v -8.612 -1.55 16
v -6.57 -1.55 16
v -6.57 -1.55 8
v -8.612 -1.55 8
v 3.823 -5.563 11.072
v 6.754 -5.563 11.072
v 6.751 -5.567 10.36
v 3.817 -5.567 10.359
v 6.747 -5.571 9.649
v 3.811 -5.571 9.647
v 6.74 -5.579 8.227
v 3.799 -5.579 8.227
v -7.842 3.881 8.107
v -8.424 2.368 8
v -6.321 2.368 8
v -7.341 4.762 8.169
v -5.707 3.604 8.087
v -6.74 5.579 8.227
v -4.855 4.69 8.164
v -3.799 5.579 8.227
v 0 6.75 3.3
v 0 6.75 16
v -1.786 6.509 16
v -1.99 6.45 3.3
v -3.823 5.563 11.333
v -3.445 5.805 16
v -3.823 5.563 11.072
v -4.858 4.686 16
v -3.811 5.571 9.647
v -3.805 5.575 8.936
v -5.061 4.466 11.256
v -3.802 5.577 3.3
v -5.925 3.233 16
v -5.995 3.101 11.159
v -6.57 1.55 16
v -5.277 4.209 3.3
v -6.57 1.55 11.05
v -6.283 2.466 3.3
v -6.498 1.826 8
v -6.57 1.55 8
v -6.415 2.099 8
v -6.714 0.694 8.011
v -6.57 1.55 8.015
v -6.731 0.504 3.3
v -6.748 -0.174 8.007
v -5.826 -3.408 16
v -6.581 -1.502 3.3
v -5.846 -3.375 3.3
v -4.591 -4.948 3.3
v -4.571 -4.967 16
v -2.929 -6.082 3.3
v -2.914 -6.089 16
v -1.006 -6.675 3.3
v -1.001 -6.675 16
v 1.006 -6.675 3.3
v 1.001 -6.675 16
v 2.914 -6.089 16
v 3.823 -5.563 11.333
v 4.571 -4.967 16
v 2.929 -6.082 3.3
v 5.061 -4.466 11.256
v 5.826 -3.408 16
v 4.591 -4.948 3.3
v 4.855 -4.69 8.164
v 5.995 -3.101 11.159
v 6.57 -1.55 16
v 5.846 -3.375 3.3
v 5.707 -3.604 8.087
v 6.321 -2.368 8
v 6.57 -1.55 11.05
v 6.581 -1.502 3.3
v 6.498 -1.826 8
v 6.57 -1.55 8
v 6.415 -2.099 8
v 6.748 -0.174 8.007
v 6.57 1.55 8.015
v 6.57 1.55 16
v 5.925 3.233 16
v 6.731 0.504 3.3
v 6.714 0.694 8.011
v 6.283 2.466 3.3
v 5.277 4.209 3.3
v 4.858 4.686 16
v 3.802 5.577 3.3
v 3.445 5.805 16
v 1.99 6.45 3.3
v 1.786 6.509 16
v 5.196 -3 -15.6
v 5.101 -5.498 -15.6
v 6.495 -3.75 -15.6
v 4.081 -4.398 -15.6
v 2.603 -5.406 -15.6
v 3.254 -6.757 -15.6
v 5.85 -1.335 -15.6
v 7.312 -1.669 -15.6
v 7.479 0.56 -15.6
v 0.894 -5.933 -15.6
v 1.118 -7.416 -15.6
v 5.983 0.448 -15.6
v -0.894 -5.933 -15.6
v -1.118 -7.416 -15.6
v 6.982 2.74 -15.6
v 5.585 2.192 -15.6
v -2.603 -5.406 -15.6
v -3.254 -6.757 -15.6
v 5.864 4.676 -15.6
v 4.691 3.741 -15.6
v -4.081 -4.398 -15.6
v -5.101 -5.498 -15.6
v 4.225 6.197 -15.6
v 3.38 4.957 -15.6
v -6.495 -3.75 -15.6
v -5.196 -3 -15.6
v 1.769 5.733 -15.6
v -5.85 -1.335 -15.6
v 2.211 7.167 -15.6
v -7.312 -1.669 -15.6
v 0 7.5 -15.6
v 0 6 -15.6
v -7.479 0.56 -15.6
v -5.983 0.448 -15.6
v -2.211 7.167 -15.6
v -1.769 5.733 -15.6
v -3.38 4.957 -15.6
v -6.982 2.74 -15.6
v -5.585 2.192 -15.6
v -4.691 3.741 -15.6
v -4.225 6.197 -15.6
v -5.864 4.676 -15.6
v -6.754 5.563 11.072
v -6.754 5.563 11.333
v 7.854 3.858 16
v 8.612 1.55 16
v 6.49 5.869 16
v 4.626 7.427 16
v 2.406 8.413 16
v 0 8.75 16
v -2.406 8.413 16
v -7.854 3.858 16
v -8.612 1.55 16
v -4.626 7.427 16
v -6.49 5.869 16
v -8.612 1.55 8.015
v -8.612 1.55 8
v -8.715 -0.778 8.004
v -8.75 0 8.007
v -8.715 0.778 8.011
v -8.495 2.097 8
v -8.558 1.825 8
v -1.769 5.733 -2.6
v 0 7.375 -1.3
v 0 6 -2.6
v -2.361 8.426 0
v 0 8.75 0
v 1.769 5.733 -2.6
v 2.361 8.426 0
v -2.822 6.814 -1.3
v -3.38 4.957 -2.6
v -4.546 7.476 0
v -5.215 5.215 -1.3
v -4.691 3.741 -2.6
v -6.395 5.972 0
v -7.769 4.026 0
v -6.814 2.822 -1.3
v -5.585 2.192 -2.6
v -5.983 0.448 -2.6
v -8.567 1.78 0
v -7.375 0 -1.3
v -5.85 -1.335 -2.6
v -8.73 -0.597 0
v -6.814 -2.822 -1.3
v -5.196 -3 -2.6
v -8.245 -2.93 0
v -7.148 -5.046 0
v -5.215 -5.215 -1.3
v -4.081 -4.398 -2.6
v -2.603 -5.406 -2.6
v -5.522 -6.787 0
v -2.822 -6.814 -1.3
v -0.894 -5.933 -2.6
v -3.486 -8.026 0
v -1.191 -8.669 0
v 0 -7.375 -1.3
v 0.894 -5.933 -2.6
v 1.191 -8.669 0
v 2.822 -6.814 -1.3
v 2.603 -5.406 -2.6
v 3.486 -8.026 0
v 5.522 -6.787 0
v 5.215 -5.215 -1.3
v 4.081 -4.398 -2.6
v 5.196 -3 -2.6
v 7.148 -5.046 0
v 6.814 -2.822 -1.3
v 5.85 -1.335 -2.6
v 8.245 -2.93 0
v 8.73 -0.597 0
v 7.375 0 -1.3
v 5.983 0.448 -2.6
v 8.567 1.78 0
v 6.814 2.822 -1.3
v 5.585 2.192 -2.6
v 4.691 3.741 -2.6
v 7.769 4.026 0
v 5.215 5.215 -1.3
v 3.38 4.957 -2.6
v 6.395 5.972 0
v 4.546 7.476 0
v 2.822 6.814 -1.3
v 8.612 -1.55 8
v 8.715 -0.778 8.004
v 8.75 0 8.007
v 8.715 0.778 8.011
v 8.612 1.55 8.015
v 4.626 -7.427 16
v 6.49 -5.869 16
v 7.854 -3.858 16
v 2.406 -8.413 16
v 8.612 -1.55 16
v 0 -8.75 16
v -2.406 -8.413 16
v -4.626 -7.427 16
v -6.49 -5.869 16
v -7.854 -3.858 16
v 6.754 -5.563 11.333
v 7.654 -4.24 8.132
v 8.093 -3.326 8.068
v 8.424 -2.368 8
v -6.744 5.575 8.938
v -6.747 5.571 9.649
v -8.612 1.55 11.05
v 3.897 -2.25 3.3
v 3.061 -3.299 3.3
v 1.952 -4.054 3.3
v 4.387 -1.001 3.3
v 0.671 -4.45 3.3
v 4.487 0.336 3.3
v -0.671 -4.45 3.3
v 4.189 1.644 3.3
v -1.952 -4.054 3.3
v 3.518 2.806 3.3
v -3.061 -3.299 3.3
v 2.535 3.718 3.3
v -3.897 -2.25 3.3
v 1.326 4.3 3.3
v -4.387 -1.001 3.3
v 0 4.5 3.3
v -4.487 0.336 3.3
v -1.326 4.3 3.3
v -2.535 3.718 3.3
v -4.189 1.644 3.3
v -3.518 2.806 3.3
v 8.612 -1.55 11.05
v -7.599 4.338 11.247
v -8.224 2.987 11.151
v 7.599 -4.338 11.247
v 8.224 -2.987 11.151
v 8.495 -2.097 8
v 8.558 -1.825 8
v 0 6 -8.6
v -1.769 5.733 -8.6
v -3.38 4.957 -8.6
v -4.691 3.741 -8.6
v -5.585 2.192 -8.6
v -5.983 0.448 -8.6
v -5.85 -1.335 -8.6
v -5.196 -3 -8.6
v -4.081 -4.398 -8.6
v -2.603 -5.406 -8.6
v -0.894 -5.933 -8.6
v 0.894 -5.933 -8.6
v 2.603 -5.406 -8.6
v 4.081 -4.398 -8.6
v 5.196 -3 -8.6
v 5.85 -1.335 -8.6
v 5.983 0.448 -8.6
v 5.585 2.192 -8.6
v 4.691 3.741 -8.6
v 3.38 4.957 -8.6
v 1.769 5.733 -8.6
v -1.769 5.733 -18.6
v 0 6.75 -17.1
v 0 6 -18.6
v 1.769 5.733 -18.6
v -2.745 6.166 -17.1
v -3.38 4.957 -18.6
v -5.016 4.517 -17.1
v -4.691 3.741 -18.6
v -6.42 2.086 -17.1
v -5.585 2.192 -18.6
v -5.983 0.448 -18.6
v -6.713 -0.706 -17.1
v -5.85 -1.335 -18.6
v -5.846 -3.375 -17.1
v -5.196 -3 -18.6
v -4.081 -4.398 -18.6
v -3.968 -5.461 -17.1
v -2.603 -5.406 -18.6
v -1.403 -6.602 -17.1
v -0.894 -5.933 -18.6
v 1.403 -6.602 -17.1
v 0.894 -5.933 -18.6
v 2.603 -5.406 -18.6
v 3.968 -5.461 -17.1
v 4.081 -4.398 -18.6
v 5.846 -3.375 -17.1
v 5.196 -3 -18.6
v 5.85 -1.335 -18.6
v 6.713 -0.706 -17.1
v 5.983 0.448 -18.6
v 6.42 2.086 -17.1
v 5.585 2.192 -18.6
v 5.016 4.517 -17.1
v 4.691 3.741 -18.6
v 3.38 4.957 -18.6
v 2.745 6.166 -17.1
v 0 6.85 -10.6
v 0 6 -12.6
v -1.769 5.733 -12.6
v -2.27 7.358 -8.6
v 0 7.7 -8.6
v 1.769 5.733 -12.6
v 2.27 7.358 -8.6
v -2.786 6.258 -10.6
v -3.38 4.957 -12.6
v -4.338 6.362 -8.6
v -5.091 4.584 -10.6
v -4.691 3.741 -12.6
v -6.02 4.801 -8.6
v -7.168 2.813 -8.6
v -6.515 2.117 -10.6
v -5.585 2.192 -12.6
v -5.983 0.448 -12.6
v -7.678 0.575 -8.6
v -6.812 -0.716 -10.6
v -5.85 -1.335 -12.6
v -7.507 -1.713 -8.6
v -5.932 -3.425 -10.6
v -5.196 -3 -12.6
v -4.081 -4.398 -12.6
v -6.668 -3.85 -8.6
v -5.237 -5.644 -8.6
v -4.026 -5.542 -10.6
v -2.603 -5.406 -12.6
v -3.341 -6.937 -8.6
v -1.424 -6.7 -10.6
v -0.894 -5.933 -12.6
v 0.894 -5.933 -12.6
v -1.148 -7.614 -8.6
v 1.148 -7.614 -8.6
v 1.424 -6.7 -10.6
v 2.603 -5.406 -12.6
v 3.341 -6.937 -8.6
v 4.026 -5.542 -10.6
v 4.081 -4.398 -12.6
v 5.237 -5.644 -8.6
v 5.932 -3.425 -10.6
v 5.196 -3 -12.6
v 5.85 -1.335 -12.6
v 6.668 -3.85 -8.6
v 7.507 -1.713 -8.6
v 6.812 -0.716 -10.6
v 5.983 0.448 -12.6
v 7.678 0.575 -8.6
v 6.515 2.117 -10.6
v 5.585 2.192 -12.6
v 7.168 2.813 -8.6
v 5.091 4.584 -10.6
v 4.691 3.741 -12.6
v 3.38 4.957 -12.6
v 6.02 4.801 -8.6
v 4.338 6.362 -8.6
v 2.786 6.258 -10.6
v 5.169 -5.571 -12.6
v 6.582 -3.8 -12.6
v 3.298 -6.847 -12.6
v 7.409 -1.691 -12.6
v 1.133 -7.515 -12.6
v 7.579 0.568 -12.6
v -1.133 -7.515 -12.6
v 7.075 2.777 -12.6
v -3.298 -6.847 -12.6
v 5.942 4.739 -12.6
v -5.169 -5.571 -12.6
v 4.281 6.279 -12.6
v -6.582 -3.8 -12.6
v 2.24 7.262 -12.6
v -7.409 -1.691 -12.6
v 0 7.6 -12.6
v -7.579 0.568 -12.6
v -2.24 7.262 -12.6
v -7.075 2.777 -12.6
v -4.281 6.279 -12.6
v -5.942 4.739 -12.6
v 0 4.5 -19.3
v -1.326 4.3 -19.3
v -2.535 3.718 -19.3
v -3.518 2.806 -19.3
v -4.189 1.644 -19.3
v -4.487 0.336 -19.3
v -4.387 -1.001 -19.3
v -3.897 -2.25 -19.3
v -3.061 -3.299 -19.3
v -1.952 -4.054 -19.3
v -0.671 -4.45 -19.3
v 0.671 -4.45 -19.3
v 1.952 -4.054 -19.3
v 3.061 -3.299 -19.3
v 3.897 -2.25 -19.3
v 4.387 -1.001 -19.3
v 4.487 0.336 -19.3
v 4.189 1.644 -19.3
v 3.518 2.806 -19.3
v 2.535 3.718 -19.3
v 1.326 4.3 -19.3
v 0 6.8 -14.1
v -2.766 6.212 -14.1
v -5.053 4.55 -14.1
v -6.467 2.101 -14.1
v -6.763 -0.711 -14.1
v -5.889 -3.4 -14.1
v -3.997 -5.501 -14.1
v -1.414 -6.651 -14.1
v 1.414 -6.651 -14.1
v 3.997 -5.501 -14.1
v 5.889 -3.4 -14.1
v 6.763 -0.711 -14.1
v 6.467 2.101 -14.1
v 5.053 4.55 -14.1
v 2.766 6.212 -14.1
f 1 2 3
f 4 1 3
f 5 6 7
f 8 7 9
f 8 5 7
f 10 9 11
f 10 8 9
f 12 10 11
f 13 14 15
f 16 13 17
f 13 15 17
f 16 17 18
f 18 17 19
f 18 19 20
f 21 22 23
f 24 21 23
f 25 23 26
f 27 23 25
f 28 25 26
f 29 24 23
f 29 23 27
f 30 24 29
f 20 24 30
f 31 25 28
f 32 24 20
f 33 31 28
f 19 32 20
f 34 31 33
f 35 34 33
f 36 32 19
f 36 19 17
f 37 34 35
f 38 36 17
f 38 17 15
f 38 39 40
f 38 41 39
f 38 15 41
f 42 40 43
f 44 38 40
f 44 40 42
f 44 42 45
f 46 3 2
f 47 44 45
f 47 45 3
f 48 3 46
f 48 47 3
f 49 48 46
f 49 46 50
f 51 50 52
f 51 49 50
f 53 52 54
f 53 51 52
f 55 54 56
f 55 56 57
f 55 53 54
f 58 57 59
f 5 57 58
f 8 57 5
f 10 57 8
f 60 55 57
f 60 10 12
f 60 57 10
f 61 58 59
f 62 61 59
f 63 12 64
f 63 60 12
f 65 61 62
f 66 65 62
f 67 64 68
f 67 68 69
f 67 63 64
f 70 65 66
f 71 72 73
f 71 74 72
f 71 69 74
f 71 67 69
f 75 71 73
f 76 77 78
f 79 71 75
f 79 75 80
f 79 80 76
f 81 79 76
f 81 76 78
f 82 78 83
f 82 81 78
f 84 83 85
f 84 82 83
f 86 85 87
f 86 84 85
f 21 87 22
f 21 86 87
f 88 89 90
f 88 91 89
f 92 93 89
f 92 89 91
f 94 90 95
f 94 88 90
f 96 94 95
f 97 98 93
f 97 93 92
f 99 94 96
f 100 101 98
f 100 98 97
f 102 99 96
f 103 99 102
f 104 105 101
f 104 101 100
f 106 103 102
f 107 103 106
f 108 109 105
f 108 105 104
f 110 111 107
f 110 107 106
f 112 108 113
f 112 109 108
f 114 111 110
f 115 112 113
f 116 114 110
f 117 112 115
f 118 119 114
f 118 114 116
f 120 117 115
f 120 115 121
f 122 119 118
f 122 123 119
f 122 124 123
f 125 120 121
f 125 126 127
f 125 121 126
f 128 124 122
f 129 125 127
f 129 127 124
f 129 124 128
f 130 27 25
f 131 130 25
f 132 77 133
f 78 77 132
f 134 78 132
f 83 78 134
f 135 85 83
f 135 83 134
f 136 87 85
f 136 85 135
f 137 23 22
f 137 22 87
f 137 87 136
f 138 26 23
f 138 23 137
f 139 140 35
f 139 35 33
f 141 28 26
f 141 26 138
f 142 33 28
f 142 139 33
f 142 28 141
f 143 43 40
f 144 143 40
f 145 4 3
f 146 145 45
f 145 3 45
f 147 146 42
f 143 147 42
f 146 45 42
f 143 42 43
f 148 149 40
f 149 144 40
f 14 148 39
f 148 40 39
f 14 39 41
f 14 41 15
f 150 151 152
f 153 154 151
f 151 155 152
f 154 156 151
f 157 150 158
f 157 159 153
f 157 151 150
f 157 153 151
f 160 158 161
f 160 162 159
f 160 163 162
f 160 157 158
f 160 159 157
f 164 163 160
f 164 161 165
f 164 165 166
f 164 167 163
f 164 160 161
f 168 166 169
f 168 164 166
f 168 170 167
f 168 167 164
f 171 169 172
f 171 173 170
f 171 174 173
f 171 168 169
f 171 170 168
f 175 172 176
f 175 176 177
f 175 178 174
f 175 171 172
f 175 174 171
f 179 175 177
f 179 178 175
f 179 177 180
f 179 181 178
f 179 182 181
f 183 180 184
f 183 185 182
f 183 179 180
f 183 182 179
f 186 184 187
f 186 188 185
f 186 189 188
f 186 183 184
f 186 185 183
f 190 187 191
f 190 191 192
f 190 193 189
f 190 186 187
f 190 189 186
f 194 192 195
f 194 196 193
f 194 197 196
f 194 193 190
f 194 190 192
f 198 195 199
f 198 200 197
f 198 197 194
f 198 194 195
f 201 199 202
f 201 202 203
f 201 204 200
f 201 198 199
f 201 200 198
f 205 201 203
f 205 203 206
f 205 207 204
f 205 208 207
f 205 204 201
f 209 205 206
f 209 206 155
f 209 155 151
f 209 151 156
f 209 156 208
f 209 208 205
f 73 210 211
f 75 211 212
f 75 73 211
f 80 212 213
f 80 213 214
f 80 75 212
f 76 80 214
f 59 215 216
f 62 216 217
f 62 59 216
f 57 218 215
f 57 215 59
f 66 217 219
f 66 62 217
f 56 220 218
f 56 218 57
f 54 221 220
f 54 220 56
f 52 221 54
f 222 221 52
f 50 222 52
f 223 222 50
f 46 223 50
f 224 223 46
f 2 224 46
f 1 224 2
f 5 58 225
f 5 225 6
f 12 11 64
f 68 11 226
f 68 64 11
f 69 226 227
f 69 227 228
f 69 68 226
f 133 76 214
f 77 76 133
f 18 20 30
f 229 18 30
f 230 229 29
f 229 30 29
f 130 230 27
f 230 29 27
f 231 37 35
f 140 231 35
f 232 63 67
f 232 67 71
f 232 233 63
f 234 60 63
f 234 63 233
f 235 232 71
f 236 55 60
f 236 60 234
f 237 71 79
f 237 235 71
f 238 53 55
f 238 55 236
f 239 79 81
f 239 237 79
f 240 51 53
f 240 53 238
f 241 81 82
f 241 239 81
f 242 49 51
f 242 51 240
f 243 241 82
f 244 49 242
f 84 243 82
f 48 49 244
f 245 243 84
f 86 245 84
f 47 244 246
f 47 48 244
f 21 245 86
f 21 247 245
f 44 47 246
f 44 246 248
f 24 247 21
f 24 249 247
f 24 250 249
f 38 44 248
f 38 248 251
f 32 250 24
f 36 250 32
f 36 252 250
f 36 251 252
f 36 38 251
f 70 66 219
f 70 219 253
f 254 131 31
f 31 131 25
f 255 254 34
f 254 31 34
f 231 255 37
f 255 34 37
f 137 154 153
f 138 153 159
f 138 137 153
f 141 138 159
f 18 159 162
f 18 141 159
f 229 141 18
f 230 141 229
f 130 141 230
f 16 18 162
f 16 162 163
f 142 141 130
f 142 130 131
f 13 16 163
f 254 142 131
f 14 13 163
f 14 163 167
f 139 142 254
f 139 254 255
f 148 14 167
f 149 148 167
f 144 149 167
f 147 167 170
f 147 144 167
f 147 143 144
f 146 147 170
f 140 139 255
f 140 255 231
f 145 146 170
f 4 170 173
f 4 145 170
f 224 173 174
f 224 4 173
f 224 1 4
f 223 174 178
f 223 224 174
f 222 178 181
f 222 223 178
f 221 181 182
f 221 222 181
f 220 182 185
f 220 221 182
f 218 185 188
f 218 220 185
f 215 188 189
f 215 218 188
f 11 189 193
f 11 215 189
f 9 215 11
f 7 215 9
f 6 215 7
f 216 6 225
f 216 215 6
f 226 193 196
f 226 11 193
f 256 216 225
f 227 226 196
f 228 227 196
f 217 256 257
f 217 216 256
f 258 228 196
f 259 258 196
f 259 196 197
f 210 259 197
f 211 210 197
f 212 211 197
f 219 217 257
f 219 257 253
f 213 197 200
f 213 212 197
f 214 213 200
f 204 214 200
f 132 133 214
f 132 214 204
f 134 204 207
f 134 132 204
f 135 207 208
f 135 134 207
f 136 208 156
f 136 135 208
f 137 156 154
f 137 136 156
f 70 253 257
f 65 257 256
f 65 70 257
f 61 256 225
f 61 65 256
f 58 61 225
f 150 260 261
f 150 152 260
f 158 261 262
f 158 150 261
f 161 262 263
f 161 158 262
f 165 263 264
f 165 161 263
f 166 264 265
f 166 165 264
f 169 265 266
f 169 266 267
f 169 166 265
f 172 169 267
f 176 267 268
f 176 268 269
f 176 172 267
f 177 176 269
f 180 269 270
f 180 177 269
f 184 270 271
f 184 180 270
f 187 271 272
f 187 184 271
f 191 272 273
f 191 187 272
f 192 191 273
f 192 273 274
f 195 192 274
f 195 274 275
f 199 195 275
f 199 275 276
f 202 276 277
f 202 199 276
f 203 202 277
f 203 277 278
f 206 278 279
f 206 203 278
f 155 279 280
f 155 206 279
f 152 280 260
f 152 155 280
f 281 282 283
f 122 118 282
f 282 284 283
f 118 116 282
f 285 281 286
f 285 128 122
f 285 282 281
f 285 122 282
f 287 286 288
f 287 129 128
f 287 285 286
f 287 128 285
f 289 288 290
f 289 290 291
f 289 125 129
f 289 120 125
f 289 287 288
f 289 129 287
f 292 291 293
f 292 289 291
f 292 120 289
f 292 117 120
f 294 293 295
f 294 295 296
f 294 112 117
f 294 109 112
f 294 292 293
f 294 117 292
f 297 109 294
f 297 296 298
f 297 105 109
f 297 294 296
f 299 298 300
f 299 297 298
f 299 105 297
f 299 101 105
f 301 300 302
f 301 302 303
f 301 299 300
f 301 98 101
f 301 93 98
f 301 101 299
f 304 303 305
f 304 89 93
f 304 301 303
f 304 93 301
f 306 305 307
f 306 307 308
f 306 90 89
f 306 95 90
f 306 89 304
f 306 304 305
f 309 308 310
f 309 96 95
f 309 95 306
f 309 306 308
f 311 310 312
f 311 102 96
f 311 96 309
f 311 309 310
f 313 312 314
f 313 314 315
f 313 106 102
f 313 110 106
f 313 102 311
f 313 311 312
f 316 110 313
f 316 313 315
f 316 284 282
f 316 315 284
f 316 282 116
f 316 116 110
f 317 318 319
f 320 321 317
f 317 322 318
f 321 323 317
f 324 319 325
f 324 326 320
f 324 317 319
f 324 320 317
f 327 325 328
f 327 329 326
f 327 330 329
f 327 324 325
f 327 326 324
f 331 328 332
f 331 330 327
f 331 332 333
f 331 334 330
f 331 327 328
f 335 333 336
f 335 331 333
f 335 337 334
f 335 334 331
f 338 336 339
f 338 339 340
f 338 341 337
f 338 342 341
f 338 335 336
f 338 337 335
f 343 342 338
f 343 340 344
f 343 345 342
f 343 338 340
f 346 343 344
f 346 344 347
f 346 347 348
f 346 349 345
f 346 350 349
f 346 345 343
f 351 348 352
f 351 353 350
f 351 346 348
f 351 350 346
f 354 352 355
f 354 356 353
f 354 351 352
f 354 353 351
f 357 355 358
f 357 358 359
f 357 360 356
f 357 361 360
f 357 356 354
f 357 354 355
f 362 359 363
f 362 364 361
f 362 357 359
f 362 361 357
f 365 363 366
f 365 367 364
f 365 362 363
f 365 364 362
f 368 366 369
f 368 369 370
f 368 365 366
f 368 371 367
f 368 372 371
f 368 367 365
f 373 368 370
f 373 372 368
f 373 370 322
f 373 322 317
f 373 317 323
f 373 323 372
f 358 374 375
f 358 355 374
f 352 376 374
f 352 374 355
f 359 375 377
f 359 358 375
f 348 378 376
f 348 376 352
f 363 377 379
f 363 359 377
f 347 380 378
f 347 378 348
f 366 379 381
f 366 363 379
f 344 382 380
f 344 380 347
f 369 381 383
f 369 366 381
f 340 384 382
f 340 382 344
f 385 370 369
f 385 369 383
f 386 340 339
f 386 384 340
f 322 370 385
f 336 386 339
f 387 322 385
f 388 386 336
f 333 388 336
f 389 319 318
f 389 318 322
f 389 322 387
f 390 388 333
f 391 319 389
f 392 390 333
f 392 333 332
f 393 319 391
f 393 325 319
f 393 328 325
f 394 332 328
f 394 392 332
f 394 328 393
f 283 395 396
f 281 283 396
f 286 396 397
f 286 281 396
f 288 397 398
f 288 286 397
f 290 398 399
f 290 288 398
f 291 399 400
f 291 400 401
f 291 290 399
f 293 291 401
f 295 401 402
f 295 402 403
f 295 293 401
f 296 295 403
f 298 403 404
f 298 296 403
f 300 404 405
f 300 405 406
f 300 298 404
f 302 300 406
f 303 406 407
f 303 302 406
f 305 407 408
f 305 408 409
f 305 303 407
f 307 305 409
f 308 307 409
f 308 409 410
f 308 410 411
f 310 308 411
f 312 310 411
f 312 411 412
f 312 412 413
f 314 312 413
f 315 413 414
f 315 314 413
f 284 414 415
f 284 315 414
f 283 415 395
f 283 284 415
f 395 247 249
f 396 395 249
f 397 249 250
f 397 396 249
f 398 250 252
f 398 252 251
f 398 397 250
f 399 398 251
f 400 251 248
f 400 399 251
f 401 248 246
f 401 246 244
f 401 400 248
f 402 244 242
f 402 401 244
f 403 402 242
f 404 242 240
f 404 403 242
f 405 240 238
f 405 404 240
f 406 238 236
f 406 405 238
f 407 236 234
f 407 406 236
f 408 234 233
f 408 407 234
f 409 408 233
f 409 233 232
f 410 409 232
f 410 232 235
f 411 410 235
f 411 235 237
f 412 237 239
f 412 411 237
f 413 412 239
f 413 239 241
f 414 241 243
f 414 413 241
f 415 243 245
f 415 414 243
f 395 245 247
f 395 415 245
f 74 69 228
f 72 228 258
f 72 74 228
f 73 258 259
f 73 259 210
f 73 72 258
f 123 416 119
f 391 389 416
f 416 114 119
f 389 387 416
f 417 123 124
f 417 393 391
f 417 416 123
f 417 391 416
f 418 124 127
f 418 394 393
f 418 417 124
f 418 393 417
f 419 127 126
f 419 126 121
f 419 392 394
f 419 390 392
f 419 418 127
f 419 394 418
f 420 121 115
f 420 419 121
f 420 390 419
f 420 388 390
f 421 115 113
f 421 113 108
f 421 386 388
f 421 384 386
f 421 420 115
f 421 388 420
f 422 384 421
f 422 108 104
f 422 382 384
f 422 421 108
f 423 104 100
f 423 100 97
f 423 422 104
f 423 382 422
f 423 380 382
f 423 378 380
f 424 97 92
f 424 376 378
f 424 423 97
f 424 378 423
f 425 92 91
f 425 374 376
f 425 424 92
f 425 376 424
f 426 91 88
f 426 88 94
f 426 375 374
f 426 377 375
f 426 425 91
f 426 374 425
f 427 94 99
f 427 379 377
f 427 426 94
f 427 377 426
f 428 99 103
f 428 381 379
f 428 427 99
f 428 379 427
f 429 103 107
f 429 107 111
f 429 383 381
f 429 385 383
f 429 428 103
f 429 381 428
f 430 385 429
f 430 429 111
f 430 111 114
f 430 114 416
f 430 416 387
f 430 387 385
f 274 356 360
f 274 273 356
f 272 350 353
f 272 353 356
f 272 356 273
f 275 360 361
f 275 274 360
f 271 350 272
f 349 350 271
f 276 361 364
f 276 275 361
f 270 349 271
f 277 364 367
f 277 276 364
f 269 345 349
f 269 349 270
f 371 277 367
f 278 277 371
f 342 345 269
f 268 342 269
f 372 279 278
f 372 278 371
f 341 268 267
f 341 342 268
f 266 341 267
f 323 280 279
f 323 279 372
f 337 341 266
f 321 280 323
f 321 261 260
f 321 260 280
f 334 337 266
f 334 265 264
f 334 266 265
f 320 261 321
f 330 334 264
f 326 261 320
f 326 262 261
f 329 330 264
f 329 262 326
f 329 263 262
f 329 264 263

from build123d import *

# Parameters (mm, degrees)
F3_DEPTH = 25
F4_DEPTH = 25


with BuildPart() as f1:
    # F0 (on Right) → F1 (revolve)
    with BuildSketch(Plane.YZ):
        Polygon((6.75, 16), (6.75, 4), (6.75, 3.3), (4.5, 3.3), (4.5, 0), (4.5, -19.3), (6, -18.6), (7.5, -15.6), (6, -15.6), (7.6, -12.6), (6, -12.6), (7.7, -8.6), (6, -8.6), (6, -2.6), (8.75, 0), (8.75, 16), align=None)
    revolve(axis=Axis((0, 0, 14.120129), (0, 0, 1)))

    # F2 (on Right) → F3 (cut)
    with BuildSketch(Plane.YZ):
        Polygon((-1.55, 11.05), (-1.55, 8), (1.55, 8.014865), (1.55, 11.05), (1.55, 16.095196), (-1.55, 16.095196), align=None)
        Polygon((-2.367748, 8), (-1.55, 8), (-1.55, 11.05), (-5.562683, 11.333183), (-5.562683, 11.072353), (-5.579271, 8.226643), align=None)
    extrude(amount=F3_DEPTH, mode=Mode.SUBTRACT)

    # F2 (on Right) → F4 (cut)
    with BuildSketch(Plane.YZ):
        Polygon((1.55, 11.05), (1.55, 8.014865), (1.55, 8), (2.367748, 8), (5.579271, 8.226643), (5.562683, 11.072353), (5.562683, 11.333183), align=None)
        Polygon((-1.55, 11.05), (-1.55, 8), (1.55, 8.014865), (1.55, 11.05), (1.55, 16.095196), (-1.55, 16.095196), align=None)
    extrude(amount=-F4_DEPTH, mode=Mode.SUBTRACT)


solid = f1.part
